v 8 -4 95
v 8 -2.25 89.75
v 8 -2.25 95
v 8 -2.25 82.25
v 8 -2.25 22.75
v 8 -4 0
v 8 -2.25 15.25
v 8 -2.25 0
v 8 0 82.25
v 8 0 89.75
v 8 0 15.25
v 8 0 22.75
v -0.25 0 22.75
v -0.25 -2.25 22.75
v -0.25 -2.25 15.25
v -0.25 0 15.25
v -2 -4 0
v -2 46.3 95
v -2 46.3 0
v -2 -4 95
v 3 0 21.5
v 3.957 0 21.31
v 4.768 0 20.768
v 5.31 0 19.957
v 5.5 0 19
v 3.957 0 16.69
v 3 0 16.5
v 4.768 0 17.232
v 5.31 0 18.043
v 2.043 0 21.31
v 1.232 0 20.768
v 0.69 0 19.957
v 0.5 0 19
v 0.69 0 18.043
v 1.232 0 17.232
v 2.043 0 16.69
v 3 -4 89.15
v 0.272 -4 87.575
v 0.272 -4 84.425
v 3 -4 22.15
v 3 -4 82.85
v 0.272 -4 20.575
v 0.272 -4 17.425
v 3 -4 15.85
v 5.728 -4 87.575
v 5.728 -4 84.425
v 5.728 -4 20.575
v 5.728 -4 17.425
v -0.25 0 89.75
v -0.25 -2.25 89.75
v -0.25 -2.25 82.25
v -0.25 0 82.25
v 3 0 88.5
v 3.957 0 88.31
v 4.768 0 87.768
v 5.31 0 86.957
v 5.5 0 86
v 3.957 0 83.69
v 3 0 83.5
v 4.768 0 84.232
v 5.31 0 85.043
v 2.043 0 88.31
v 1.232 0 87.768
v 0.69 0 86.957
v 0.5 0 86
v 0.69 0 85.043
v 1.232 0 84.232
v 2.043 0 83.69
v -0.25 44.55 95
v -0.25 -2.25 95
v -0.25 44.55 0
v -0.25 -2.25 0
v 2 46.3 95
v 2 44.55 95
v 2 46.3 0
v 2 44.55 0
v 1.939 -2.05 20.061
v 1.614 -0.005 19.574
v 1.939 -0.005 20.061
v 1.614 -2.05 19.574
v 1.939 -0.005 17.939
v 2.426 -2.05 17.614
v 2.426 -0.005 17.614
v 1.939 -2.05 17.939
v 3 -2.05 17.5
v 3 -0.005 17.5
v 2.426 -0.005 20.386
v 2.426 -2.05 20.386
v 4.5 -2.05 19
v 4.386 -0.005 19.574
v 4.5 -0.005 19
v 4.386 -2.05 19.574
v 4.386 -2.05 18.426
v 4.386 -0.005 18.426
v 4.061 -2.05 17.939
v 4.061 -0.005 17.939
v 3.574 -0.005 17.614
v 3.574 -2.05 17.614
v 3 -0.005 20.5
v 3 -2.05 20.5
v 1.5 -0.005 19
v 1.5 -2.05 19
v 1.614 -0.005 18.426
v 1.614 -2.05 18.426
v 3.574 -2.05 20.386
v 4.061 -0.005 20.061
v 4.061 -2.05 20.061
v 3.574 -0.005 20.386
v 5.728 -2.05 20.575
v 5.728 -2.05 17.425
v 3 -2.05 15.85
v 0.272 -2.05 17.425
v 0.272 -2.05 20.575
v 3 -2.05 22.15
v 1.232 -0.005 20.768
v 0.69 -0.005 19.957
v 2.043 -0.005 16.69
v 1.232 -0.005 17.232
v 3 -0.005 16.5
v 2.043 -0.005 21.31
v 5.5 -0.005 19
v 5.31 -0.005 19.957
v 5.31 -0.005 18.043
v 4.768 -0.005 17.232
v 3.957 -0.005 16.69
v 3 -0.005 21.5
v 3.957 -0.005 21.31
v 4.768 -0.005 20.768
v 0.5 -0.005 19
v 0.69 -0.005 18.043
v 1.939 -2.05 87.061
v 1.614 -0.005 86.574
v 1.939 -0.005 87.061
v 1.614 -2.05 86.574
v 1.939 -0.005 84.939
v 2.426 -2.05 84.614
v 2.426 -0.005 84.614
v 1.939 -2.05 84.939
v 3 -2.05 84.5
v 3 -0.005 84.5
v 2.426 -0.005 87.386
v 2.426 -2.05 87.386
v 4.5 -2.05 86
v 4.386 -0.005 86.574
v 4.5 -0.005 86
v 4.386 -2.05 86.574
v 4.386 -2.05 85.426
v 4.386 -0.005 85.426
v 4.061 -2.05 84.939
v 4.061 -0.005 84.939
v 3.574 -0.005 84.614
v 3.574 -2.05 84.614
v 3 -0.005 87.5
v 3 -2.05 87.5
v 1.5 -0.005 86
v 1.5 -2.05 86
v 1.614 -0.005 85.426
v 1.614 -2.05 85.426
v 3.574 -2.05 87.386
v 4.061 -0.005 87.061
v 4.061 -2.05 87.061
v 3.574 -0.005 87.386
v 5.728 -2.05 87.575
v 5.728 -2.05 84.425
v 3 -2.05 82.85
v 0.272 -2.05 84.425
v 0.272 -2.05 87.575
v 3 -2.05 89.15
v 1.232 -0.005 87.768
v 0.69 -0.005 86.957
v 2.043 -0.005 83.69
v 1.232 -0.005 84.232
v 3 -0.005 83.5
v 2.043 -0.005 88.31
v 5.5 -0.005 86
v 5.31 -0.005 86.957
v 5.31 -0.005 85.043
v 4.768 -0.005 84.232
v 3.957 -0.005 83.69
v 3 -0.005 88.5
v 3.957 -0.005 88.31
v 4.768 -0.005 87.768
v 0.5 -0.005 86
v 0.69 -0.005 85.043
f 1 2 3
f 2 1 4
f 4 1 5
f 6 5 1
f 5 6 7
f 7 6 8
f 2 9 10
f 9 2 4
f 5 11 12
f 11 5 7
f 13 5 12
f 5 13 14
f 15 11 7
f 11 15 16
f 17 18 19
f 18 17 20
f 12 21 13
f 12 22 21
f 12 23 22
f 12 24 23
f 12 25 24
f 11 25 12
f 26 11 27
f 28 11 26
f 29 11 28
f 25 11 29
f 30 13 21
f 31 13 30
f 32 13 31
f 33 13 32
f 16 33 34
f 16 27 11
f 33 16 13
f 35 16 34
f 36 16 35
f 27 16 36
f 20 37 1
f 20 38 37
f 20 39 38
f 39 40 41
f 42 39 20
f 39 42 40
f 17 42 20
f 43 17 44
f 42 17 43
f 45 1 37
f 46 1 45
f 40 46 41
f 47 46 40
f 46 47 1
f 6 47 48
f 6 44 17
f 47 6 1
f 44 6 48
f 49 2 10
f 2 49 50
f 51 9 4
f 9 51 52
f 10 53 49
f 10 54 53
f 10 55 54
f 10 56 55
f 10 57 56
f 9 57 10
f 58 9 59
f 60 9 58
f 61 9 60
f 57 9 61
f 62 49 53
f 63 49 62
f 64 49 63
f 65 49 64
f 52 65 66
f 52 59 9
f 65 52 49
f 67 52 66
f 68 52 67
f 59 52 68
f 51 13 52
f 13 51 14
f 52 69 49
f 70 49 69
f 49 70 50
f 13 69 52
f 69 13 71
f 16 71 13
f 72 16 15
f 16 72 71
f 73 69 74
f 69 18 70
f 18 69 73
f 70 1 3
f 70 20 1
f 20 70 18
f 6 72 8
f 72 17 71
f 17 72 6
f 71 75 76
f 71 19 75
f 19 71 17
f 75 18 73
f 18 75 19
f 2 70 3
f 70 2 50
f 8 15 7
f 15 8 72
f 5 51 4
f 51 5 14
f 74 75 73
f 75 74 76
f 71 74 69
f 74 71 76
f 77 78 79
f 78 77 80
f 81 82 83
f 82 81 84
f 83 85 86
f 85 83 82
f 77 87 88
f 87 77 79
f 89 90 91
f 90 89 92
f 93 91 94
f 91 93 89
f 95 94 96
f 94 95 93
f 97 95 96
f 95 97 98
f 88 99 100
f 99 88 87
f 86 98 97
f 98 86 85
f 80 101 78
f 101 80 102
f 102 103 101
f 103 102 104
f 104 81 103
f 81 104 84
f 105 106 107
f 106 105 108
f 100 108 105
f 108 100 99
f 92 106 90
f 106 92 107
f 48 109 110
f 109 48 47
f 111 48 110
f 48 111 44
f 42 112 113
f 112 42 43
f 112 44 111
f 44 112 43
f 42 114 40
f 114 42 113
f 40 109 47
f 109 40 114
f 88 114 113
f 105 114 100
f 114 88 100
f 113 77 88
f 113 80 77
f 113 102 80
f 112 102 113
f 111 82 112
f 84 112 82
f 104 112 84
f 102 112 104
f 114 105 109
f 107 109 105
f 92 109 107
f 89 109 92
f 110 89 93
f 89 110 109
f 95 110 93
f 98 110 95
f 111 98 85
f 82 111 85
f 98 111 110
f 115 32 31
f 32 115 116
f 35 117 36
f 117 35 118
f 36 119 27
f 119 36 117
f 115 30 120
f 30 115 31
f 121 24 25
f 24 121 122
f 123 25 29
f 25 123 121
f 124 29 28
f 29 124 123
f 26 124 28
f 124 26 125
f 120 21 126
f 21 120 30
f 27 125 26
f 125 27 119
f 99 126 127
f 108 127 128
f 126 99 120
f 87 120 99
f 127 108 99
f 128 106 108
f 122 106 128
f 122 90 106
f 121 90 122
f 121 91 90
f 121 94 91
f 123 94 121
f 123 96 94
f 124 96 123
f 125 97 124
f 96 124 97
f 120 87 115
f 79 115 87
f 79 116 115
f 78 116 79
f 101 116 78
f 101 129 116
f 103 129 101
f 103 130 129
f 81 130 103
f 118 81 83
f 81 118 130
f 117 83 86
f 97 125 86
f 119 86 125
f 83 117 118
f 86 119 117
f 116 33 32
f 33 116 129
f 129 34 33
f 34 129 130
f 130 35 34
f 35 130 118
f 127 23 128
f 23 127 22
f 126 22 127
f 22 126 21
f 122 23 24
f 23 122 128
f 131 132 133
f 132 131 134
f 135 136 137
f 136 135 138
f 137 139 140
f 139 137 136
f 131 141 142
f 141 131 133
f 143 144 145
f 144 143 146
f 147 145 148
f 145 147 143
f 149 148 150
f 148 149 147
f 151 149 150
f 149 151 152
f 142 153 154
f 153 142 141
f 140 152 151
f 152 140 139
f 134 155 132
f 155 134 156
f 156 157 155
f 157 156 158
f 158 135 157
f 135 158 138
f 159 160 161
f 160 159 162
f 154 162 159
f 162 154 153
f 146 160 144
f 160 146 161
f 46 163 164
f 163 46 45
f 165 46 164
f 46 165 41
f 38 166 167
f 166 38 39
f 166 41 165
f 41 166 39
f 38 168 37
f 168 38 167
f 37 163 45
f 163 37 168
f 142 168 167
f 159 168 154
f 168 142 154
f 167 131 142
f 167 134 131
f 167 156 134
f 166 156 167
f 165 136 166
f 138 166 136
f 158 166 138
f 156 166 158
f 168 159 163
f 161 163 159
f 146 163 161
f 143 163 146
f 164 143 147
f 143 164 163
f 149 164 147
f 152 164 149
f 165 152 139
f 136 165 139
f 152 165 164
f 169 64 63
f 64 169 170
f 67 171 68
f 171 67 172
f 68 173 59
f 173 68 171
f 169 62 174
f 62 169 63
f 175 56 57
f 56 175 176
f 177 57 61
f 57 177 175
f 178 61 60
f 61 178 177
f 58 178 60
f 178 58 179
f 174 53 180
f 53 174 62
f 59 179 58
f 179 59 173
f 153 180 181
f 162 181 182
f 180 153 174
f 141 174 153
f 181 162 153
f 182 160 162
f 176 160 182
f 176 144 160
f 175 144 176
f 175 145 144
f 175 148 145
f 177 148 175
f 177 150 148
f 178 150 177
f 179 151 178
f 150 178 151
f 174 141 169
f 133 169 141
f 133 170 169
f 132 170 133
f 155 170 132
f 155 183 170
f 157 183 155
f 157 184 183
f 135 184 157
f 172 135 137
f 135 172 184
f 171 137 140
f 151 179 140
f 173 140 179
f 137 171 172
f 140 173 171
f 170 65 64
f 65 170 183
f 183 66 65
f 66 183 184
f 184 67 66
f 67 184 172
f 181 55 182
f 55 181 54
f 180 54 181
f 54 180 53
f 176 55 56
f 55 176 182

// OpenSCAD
// file: ../library/din41612/din41612_male_dim.scad
include <../linurs/linurs_screw_dim.scad>

// connector dimensions
din41612_male_l=94.5;    // lenght of the connector
din41612_male_l1=87.5;   // 
din41612_male_w=13;      // width of the connector
din41612_male_w1=6.4;    // 
din41612_male_w2=5.6;    // 
din41612_male_h=11;      // height of the connector
din41612_male_h1=1.6;    // 
din41612_male_h2=6;      // 

din41612_male_dl=88.9;   // distance between mounting holes
// file: ../library/din41612/din41612_female_dim.scad
include <../linurs/linurs_screw_dim.scad>

// connector dimensions
din41612_female_l=95;       // lenght of the connector
din41612_female_l1=85;      // lenght of the connector head
din41612_female_h=11.6;     // height of the connector
din41612_female_h1=5.2;     // height produced by the connector when pulgged in 
din41612_female_w=11;       // width of the connector
din41612_female_w1=8.5;     // width of the connector head

din41612_female_dl=90;      // distance between mounting holes
// file: ../library/linurs/linurs_screw.scad
// Metric screws and nuts 
// urs@linurs.org 2019
// It is targeted for 3D printing applications. 
// To look realistic is not the goal (Example: Nuts do not have a hole)

include <linurs_screw_dim.scad>

d=0; //[0:M2_5,1:M3,2:M4,3:M5]
type=0;//[0:head_cyl,1:head_cnt,2:head_no,3:head_hex]
w=15; 
i=10;
nut_sink=0;
screw_sink=0; 
t=0.01;
fn=16;

/* [hex_bolt] */
show_hex_bolt=false;

/* [nut] */
show_nut=false;

/* [screw] */
show_screw=false;

/* [screw_fix] */
show_screw_fix=false;

/* [screw_cut] */
show_screw_cut=false;

/* [nut_cut] */
show_nut_cut=false;
wi=0; 
rot=false;

// functions used multiple times to position nuts and heads
function headh_cyl(d)=screw_cyl[d][1];  // height of cyl screw head
function headh_cnt(d)=screw_cyl[d][1];  // height of cnt screw head
function headh(d,type=head_cyl)=(type==head_cyl ? headh_cyl(d) : (type==head_cnt ? headh_cnt(d) : 0 )); // height of screw head 

function nuth(d)=screw_hex[d][2];   // height of hex nut

// head of a cylinder screw
module screw_head_cyl(d=M3, t=0)
{
  screwhd=screw_cyl[d][0]+t; // diameter of cylinder screw head
  cylinder(d=screwhd,h=headh(d=d, type=head_cyl), center=true,$fn=16); // screw head
}

// head of a countersunk screw
module screw_head_cnt(d=M3, t=0)
{
  screwd=screw_d[d]+t; 
  screwhd=screw_cnt[d][0]+t; // diameter of cylinder screw head
  cylinder(d1=screwd,d2=screwhd,h=headh(d=d,type=head_cnt), center=true,$fn=16); // screw head
}

// head of a hex screw
module screw_head_hex(d=M3, t=0)
{
    translate([0,0,-nuth(d)/2])nut(d=d, t=t);
}

// head of all screws
module screw_head(d=M3, type=head_cyl, t=0)
{ 
  if(type==head_cnt){
    screw_head_cnt(d=d, t=t);
  } else {
    if(type==head_cyl){
      screw_head_cyl(d=d, t=t);
    } else {
       if(type==head_hex){
           screw_head_hex(d=d, t=t); 
       } 
    }    
  }
}

// hex bolt 
module hex_bolt(d=M3, w=10, t=0)
{
  nutd=screw_hex[d][1]+t; // outer diameter of hex bolt
  cylinder(r=nutd/2,h=w+t, center=true,$fn=6); // nut
}

// nut 
module nut(d=M3, t=0)
{
  hex_bolt(d=d, w=nuth(d), t=t);    
}

// screw 
// w outer width of the screw = screw length + head 
module screw(w=10, d=M3, type=head_cyl, t=0){
  screwd=screw_d[d]+t;       // screw diameter
  cylinder(d=screwd, h=w, center=true,$fn=16); // screw thread length
  translate([0,0,w/2-headh(d=d,type=type)/2])
  screw_head(d=d,type=type, t=t);
}

// screw fix
// w outer width of the screw = screw length + head 
// sink additional material below to remove 
// raise additional material above to remove
module screw_fix(w=10, d=M3, type=head_cyl, screw_sink=0, nut_sink=0, t=0){
  screw(w=w, d=d, type=type, t=t);
  translate([0,0,-w/2+nuth(d)/2])
    nut(d=d,t=t);
  //additional material to be removed above the nut  
  translate([0,0,-(w+nut_sink)/2])hex_bolt(d=d,w=nut_sink+0.01,t=t);    
  //additional material to be removed above the screw head
  if(type==head_cnt){  
    translate([0,0,w/2+screw_sink])
    cylinder(d=screw_cnt[d][0]+t,h=screw_sink+0.01,center=true,$fn=16);
  }else{ 
    translate([0,0,(w+screw_sink)/2])
    cylinder(d=screw_cyl[d][0]+t,h=screw_sink+0.01,center=true,$fn=16);
  }     
}

// screw cut
// material to be extracted from object to slide in a counter sunk screw for fixation
// w height of the cut out
// i depth of the screw
module screw_cut(d=M3,w=20,i=10,t=0,fn=32){
    hsh=screw_cnt[d][1];
    ws=screw_cnt[d][0]+t;
    ds=screw_d[d]+t;
    
    translate([i/2,0,-(w-hsh)/2])
      cube([i,ws,hsh],center=true);
    
    translate([0,0,-(w-hsh)/2])
      cylinder(d=ws,h=hsh,center=true,$fn=32);
    
    translate([0,0,-(w-hsh)/2+hsh])
        cylinder(d2=ds, d1=ws, h=hsh,center=true,$fn=fn);
    
    cylinder(h=w, d=ds, center=true, $fn=fn);   
    
    translate([i/2,0,0]) 
        cube([i,ds,w],center=true);
    
    for(y=[-1,1]){
        translate([i/2,y*ds/2,-w/2+hsh])
            rotate([45,0,0])
            cube([i,sqrt(2)*(ws-ds)/2,sqrt(2)*(ws-ds)/2],center=true);
    }
}
//screw_cut();

// nut cut
// material to be extracted from object to slide in a nut for fixation
// w height of the cylinder
// i lenght of the inlet
module nut_cut(w=10, wi=0, d=M3, i=10, t=0, rot=false,type=head_cyl){ 
  r=(rot)?90:0;
  ds=(rot)?screw_hex[d][1]:screw_hex[d][0];
  rotate([0,0,r])nut(d,t);
  translate([i/2,0,0])
    cube([i,ds+t,nuth(d)+t],center=true);
  translate([0,0,-wi])
      if(type==head_cnt){    
          screw(w=w, d=d, type=type, t=t); 
        translate([0,0,w/2])
          cylinder(d=screw_cnt[d][0]+t,h=raise,center=true,$fn=16);
      }
      else{ 
          screw(w=w, d=d, type=type, t=t);   
  //      translate([0,0,0])
          //#cylinder(d=screw_cyl[d][0]+t,h=w,center=true,$fn=16);
      }       
}

if(show_hex_bolt==true){
   hex_bolt(d=d, w=w, t=t);
}

if(show_nut==true){
  nut(d=d, t=t);
}    

if(show_screw==true){
   screw(w=w, d=d, type=type, t=t);
}

if(show_screw_fix==true){
  screw_fix(w=w, d=d, type=type, nut_sink=nut_sink, screw_sink=screw_sink, t=t);
}

if(show_screw_cut==true){
  screw_cut(d=d,w=w,i=i,t=t,$fn=fn);
}    

if(show_nut_cut==true){
  nut_cut(w=w, wi=wi, d=d, i=i, t=t,rot=rot,type=type);
}  
// file: bracket_dim.scad
// bracket

include <../pcb/pcb_dim.scad>
include <../motherboard/motherboard_dim.scad>
include <../library/linurs/linurs_screw_dim.scad>

bracket_screw=M2_5;   // hole for the screw

bracket_gap=0.5;      // gap between bracket to make sure it fits in the box
bracket_screw_gap=0.5;// gap to fit the screw

bracket_l=pcb_w+15;   // height of bracket
bracket_l1=19;        // hole l
bracket_l2=3*screw_d[bracket_screw];
bracket_ld=pcb_wd;    // hole distance

bracket_h=10;         // depth of the U shape at the side of the screw
bracket_h1=4;         // depth of the U shape at the side where no screw is 
bracket_h2=2-bracket_gap/2;   // thickness of bracket
bracket_h3=5;         // hole h

bracket_w1=4;         // height of the mounting hole cube
bracket_tn=2;         // thickness of bracket
bracket_t=bracket_tn-bracket_gap/2;  // thickness of bracket - gap

bracket_offset_z=-10;  // bracket offset in elecbox z axis

function bracket_w(n)=step*n-bracket_gap;
function bracket_w2(n)=step*n-2*bracket_tn;
// file: ../library/linurs/linurs_screw_dim.scad
// Metric screws and nuts 
// urs@linurs.org

// contains dimensions of linurs_screw and can be included in other 
// OpenScad files 

// Parameters in this file
// d screw diameter M2_5, M3, ... (enumeration with screw_d)
// t millimeters added to diameters 

// enumerations of metric threads
M2_5=0;
M3=1;
M4=2;
M5=3;

// enumerations screw head type
head_cyl=0; // cylinder
head_cnt=1; // countrsunk
head_no=2;  // no head at all
head_hex=3;  // no head at all

// screw diameters
screw_d=[
2.5, // M2.5
3.0, // M3
4.0, // M4
5.0  // M5
];

// sizes for hex nuts
screw_hex=[
//   s,   e,   h
 [ 5.0, 5.8, 1.7], // M2.5
 [ 5.5, 6.4, 2.0], // M3
 [ 7.0, 8.1, 2.8], // M4
 [ 8.0, 9.2, 3.5]  // M5
];

// sizes for cylinder screw heads
screw_cyl=[
//   d,   h
 [ 4.5, 1.6], // M2.5
 [ 5.5, 2.0], // M3
 [ 7.0, 2.6], // M4
 [ 8.5, 3.3]  // M5
];

// sizes for countersunk screw heads
screw_cnt=[
//   d,   h
 [ 4.7, 1.50], // M2.5
 [ 5.6, 1.65], // M3
 [ 7.4, 2.20], // M4
 [ 9.2, 2.50]  // M5
];
// file: ../motherboard/motherboard_dim.scad
include <../library/linurs/linurs_screw_dim.scad>
include <../library/din41612/din41612_female_dim.scad>
include <../library/din41612/din41612_male_dim.scad>
include <../pcb/pcb_dim.scad>
// motherboard pcb dimensions
motherboard_l=pcb_l;   // pcb width
motherboard_h=1.6;     // pcb thickness
step=25.4;             // distance between modules

function motherboard_w(n)=din41612_female_w+step*(n-1);

screw_motherboard_d=M2_5;
screw_motherboard_l=16;
motherboard_pass=0.5;// gap to fit screws 

motherboard_z_offset=-din41612_male_w1-din41612_female_h1-motherboard_h;
// file: ../pcb/pcb_dim.scad
// The pcb is the master object of the project
// therefore no other include files from other objects
// are necessary

// pcb constants
pcb_l =100;  // lenght of the pcb
pcb_ld = 94; // hole distance 
pcb_w=80;    // height of the pcb
pcb_wd = 67; // hole distance
pcb_wd1 = 9; // hole to edge distance 
pcb_d=3;     // diameter of holes
pcb_h=1.6;   // thickness
// main file
// bracket
// =======
// A bracket of the elecbox module
// - type: 0 front bracket, 1 rear bracket
// - width 1..n in steps

// parameters for customizer
// bracket width
n=2; // [1,2,3,4,5,6,7,8]
// type
bracket="Front"; // [Front,Back]
// intermediate mounting holes
intermediate=false;  

include <../pcb/pcb_dim.scad>

include <../motherboard/motherboard_dim.scad>
include <../library/linurs/linurs_screw_dim.scad>
include <bracket_dim.scad>

use <../library/linurs/linurs_screw.scad>
    
module back_bracket(n=1, intermediate=false){
  mirror([1,0,0])       // mirror it if desired
  front_bracket(n=n, intermediate=intermediate); 
}
    
module front_bracket(n=1, intermediate=false){
  echo("bracket");  
  //color("White")
  intermediatestep=(intermediate)?step:0; 
  difference(){
    union(){
      translate([-bracket_h2/2-bracket_gap/2,
                 bracket_w(n)/2-bracket_w1,
                 bracket_l/2])  
      cube([bracket_h2,
            bracket_w(n),
            bracket_l],center=true); // create the bracket front
  
      translate([bracket_h/2-bracket_h2-bracket_gap/2,
                 bracket_t/2-bracket_w1,
                 bracket_l/2]) 
      cube([bracket_h,
            bracket_t,
            bracket_l],center=true); // U shape side of the screw
      
      translate([bracket_h1/2-bracket_h2-bracket_gap/2,
                 bracket_w(n)-bracket_w1-bracket_t/2,
                 bracket_l/2]) 
      cube([bracket_h1,
            bracket_t,
            bracket_l],center=true); // U shape where no screw  
      for(x=[1:n]){  // create the mounting hole cubes 
        for(z=[bracket_l1,
               bracket_l1+bracket_ld]){
          translate([ bracket_h/2-bracket_h2-bracket_gap/2,
                     -bracket_w1/2+(x-1)*intermediatestep,
                     z])
          cube([bracket_h,
                bracket_w1,
                bracket_l2],center=true);
        }
      }   
    }
    for(x=[1:n]){ // create the mounting hole 
      for(z=[bracket_l1,
             bracket_l1+bracket_ld]){
        translate([bracket_h3-bracket_h2-bracket_gap/2,
                  -bracket_w1/2+(x-1)*intermediatestep,
                   z])
        rotate([0,90,0])
        rotate([-90,0,0])
        screw_fix(w=bracket_w1,d=bracket_screw,type=head_no, t=bracket_screw_gap);
      }
    }
  }
}

if(bracket=="Front"){
  front_bracket(intermediate=intermediate,n=n);
}

if(bracket=="Back"){
  back_bracket(intermediate=intermediate,n=n);
}
